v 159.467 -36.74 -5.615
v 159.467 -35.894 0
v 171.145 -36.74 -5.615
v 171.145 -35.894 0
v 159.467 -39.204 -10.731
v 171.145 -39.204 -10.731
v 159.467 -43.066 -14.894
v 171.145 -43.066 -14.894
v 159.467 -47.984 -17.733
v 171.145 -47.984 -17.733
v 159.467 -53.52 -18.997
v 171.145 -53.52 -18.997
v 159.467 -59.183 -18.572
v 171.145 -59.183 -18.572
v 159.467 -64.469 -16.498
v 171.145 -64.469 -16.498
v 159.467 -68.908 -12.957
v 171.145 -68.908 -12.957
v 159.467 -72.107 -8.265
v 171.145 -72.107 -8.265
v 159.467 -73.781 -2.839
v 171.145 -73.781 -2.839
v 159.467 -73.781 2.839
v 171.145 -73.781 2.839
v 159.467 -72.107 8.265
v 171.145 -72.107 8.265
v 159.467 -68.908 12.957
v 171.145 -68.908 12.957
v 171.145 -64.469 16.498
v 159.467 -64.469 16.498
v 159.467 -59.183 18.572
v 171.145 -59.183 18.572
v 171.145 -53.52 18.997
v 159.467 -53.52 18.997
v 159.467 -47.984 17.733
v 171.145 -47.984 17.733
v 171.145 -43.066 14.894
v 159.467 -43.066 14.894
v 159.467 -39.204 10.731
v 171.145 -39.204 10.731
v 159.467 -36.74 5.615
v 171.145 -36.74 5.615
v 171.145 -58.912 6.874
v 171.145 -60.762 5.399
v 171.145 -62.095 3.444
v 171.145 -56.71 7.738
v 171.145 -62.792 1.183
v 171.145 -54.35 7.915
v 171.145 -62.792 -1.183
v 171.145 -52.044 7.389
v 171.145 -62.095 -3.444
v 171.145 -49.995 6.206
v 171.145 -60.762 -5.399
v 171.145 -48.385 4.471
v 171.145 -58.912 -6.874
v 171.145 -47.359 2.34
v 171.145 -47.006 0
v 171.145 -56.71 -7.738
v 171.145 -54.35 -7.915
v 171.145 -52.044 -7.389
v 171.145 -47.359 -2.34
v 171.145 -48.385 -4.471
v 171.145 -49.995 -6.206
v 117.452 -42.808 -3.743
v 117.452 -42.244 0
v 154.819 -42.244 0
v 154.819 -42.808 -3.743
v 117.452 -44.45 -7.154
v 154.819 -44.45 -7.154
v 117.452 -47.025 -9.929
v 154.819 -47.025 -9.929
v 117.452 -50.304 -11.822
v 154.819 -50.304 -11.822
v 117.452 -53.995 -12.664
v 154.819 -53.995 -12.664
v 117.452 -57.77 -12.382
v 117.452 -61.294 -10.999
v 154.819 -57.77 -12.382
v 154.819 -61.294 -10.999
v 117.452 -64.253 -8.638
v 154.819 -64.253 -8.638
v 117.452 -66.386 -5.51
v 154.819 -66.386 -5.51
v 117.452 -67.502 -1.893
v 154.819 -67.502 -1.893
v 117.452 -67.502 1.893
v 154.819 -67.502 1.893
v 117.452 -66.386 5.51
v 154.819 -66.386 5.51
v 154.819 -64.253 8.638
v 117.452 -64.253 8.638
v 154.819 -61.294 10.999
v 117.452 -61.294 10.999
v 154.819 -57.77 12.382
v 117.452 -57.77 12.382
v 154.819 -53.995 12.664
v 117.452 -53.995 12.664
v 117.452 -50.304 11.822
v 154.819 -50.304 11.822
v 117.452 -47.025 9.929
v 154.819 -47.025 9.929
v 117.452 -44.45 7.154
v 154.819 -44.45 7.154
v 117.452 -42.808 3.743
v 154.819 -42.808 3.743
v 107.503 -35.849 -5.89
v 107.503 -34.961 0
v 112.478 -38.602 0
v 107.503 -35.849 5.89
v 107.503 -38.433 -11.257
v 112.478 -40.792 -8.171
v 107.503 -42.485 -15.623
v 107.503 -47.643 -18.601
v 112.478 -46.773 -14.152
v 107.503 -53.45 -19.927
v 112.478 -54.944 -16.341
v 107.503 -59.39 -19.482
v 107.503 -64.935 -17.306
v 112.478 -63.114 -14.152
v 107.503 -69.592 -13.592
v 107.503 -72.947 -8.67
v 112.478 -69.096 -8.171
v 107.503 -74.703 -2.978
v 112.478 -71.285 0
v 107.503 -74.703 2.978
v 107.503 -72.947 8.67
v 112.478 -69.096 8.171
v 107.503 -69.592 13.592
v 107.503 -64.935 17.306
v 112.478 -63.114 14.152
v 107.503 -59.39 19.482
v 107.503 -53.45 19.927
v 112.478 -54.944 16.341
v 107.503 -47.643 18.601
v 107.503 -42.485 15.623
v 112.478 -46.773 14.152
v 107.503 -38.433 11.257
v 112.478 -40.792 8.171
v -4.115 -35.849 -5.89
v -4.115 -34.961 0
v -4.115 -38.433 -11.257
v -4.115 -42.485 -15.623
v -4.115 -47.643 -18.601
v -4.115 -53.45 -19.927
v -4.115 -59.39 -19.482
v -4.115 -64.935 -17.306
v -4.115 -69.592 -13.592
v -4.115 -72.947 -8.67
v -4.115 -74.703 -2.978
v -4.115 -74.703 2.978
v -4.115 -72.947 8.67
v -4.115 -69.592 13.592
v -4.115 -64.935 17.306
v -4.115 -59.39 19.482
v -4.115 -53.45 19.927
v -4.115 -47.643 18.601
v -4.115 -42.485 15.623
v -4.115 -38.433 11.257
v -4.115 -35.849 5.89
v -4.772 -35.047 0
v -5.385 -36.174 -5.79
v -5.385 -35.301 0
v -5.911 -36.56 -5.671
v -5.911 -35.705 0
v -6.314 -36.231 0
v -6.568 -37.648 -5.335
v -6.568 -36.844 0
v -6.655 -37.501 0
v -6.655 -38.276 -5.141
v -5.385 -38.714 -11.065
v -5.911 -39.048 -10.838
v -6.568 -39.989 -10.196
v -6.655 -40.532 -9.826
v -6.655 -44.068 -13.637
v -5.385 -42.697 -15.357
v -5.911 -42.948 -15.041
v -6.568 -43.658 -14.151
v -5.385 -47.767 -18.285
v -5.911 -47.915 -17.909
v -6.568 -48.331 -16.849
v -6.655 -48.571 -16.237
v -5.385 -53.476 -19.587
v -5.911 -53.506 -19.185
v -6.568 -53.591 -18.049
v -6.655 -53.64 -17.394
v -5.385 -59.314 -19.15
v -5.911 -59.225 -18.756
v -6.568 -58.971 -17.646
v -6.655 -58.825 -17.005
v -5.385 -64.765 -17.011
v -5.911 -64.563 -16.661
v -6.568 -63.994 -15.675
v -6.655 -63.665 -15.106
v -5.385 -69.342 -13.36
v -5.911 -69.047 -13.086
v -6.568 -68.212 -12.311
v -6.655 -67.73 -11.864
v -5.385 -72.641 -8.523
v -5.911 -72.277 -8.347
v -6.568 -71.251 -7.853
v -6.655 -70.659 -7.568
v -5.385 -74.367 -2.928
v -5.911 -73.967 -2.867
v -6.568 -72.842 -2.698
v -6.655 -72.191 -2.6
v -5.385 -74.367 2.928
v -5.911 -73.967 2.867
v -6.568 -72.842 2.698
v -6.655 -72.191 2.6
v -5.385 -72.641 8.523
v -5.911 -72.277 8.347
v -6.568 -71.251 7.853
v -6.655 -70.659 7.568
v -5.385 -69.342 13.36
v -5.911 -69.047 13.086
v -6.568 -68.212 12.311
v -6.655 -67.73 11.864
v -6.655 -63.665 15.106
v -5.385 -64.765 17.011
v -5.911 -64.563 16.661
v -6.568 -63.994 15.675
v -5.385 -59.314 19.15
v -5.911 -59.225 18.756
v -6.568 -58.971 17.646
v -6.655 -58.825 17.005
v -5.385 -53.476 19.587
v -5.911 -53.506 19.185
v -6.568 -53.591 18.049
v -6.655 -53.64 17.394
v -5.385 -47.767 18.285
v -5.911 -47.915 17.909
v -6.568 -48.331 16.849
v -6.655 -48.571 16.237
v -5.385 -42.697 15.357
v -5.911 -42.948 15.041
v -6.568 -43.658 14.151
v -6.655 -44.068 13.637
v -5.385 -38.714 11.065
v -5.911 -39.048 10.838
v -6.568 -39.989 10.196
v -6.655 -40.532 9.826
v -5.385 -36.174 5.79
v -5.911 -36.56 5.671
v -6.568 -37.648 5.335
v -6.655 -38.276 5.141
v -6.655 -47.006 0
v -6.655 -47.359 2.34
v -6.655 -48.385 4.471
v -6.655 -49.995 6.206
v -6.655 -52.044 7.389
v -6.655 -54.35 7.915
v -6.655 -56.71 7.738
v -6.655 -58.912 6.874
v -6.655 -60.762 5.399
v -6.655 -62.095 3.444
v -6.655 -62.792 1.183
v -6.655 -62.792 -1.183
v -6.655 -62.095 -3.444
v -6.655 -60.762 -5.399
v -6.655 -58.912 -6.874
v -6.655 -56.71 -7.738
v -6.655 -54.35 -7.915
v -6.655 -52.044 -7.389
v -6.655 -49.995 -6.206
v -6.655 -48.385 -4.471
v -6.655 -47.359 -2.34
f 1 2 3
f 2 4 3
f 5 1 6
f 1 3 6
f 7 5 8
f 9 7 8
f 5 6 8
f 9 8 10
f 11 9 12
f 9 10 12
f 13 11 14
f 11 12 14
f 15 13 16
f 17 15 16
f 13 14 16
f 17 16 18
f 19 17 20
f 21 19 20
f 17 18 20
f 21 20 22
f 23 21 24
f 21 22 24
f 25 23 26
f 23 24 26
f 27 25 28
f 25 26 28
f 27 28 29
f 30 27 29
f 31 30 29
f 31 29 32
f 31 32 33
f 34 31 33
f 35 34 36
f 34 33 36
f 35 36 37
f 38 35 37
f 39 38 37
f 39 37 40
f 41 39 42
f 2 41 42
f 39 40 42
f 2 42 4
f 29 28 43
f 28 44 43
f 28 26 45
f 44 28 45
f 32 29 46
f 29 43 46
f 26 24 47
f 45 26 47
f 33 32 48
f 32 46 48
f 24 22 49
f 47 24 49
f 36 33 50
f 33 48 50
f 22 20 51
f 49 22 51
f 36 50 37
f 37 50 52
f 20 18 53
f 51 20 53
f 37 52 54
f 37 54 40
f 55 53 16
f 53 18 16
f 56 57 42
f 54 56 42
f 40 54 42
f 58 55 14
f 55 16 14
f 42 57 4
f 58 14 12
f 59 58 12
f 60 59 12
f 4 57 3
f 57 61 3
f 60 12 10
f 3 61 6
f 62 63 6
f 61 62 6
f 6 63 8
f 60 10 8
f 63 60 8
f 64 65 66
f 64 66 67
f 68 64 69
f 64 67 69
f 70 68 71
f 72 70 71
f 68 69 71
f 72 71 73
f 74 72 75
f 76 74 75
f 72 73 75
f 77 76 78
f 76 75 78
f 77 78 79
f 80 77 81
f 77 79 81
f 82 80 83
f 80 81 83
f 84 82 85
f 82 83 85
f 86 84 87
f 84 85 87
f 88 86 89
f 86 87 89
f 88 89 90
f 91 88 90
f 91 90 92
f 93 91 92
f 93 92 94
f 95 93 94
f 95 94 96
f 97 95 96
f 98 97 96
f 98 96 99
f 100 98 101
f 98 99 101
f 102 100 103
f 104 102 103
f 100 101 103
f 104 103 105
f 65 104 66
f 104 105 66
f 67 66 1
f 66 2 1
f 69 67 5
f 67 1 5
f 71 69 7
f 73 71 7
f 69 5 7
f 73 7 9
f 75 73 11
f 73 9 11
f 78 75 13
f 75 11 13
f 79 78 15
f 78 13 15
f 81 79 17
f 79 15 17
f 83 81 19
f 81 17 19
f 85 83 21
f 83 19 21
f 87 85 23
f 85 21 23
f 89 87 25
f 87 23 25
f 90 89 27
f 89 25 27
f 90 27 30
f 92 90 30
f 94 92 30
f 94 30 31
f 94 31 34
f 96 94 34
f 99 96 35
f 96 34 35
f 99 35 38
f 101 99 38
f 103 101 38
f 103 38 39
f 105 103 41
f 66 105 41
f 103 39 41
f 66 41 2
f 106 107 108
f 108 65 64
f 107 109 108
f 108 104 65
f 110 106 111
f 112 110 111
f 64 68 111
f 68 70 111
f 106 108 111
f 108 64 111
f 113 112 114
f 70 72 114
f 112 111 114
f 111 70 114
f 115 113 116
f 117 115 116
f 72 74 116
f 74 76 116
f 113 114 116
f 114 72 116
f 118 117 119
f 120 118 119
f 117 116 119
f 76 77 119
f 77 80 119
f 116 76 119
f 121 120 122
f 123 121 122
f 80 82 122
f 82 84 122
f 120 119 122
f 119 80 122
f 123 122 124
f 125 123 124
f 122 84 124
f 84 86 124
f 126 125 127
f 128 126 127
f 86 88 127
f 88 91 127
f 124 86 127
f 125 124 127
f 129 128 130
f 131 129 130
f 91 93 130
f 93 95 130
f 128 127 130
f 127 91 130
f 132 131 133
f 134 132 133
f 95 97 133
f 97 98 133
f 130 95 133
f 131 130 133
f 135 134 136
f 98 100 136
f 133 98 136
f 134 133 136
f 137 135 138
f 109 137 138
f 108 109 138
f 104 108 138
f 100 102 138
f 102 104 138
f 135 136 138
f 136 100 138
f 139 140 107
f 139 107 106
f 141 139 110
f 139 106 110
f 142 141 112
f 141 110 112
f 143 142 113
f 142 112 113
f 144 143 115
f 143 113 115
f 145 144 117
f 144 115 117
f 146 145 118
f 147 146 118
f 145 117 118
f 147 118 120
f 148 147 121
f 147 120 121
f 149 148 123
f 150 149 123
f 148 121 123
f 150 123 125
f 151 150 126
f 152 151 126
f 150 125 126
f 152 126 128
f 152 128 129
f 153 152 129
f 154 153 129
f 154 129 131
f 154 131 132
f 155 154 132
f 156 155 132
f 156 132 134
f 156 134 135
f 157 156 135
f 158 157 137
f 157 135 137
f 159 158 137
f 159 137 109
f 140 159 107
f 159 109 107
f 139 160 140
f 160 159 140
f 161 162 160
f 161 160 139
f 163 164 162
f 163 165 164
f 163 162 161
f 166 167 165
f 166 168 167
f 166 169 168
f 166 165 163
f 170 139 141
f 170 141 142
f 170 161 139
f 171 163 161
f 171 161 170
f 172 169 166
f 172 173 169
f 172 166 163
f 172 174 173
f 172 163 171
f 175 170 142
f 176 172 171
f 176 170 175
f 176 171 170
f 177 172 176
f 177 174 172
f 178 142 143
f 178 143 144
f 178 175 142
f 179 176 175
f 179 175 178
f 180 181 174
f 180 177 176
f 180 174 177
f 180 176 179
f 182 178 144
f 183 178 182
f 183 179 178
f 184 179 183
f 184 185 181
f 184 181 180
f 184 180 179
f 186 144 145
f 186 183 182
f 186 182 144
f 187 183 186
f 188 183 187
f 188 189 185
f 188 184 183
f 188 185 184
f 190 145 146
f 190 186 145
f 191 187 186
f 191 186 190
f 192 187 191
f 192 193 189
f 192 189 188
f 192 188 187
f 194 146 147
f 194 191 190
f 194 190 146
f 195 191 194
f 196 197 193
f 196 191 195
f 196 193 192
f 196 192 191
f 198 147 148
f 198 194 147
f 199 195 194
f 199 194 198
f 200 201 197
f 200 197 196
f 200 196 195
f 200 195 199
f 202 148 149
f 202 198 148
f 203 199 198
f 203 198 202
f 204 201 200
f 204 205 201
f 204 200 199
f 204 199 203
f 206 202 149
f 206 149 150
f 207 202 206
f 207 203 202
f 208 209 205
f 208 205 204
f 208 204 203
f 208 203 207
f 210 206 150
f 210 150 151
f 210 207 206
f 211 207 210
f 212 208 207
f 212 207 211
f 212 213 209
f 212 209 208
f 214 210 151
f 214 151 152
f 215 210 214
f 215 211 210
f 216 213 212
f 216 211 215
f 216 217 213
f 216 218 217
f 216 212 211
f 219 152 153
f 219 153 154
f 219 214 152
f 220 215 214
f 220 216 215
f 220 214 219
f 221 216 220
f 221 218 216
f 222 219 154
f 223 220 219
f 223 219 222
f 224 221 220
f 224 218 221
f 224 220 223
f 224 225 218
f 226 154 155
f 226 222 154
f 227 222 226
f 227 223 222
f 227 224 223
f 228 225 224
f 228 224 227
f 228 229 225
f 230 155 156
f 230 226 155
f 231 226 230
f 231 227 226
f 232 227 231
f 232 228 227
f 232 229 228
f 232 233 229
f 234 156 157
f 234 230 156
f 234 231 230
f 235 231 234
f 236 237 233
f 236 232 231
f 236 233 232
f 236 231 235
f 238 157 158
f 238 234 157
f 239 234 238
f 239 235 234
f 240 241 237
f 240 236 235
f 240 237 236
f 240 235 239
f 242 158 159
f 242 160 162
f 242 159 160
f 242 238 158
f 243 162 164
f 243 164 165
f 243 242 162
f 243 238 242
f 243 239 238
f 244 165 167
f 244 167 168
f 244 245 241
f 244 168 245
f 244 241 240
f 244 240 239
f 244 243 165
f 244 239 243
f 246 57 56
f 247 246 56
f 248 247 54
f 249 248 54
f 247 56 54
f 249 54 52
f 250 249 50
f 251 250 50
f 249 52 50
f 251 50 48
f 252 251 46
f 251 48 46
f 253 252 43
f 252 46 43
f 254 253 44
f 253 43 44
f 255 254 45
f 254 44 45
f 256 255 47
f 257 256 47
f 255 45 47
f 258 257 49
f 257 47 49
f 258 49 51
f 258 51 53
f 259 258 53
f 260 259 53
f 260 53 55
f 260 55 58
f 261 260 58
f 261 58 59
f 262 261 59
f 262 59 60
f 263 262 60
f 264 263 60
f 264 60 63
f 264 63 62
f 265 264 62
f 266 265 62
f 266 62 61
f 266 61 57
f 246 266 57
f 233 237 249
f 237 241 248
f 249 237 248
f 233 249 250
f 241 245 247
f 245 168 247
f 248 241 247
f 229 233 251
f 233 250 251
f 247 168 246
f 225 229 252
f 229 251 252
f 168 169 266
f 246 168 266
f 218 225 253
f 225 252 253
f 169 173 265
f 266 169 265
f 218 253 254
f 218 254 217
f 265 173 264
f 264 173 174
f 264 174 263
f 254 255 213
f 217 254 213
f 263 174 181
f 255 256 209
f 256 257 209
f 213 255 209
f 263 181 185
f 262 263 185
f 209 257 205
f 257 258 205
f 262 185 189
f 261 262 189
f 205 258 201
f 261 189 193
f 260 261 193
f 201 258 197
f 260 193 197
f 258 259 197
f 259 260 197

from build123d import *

# Parameters (mm, degrees)
SKETCH4_R          = 7.9375
CUT_EXTRUDE1_DEPTH = 190.5
FILLET1_R          = 2.54


with BuildPart() as part:
    # Sketch1 → Revolve1 (revolve)
    with BuildSketch(Plane.XY):
        Polygon((107.503032851, -34.960925594), (117.452183803, -42.243603137), (154.81866926, -42.243603137), (159.466804827, -35.893603137), (171.145497316, -35.893603137), (171.145497316, -54.943603137), (-6.654502684, -54.943603137), (-6.654502684, -34.960925594), align=None)
    revolve(axis=Axis((171.145497316, -54.943603137, 0), (-1, 0, 0)))

    # Sketch4 → Cut-Extrude1 (cut)
    with BuildSketch(Plane(origin=(171.145497316, 0, 0), x_dir=(0, 0, -1), z_dir=(1, 0, 0))):
        with Locations(Location((0, -54.943603137, 0), (0, 0, 90))):
            Circle(SKETCH4_R)
    extrude(amount=-CUT_EXTRUDE1_DEPTH, mode=Mode.SUBTRACT)

    # Fillet1
    fillet1_edges = [part.edges().sort_by_distance(p)[0] for p in [
        (-6.654502684, -74.926280681, 0),
    ]]
    fillet(fillet1_edges, radius=FILLET1_R)


solid = part.part
